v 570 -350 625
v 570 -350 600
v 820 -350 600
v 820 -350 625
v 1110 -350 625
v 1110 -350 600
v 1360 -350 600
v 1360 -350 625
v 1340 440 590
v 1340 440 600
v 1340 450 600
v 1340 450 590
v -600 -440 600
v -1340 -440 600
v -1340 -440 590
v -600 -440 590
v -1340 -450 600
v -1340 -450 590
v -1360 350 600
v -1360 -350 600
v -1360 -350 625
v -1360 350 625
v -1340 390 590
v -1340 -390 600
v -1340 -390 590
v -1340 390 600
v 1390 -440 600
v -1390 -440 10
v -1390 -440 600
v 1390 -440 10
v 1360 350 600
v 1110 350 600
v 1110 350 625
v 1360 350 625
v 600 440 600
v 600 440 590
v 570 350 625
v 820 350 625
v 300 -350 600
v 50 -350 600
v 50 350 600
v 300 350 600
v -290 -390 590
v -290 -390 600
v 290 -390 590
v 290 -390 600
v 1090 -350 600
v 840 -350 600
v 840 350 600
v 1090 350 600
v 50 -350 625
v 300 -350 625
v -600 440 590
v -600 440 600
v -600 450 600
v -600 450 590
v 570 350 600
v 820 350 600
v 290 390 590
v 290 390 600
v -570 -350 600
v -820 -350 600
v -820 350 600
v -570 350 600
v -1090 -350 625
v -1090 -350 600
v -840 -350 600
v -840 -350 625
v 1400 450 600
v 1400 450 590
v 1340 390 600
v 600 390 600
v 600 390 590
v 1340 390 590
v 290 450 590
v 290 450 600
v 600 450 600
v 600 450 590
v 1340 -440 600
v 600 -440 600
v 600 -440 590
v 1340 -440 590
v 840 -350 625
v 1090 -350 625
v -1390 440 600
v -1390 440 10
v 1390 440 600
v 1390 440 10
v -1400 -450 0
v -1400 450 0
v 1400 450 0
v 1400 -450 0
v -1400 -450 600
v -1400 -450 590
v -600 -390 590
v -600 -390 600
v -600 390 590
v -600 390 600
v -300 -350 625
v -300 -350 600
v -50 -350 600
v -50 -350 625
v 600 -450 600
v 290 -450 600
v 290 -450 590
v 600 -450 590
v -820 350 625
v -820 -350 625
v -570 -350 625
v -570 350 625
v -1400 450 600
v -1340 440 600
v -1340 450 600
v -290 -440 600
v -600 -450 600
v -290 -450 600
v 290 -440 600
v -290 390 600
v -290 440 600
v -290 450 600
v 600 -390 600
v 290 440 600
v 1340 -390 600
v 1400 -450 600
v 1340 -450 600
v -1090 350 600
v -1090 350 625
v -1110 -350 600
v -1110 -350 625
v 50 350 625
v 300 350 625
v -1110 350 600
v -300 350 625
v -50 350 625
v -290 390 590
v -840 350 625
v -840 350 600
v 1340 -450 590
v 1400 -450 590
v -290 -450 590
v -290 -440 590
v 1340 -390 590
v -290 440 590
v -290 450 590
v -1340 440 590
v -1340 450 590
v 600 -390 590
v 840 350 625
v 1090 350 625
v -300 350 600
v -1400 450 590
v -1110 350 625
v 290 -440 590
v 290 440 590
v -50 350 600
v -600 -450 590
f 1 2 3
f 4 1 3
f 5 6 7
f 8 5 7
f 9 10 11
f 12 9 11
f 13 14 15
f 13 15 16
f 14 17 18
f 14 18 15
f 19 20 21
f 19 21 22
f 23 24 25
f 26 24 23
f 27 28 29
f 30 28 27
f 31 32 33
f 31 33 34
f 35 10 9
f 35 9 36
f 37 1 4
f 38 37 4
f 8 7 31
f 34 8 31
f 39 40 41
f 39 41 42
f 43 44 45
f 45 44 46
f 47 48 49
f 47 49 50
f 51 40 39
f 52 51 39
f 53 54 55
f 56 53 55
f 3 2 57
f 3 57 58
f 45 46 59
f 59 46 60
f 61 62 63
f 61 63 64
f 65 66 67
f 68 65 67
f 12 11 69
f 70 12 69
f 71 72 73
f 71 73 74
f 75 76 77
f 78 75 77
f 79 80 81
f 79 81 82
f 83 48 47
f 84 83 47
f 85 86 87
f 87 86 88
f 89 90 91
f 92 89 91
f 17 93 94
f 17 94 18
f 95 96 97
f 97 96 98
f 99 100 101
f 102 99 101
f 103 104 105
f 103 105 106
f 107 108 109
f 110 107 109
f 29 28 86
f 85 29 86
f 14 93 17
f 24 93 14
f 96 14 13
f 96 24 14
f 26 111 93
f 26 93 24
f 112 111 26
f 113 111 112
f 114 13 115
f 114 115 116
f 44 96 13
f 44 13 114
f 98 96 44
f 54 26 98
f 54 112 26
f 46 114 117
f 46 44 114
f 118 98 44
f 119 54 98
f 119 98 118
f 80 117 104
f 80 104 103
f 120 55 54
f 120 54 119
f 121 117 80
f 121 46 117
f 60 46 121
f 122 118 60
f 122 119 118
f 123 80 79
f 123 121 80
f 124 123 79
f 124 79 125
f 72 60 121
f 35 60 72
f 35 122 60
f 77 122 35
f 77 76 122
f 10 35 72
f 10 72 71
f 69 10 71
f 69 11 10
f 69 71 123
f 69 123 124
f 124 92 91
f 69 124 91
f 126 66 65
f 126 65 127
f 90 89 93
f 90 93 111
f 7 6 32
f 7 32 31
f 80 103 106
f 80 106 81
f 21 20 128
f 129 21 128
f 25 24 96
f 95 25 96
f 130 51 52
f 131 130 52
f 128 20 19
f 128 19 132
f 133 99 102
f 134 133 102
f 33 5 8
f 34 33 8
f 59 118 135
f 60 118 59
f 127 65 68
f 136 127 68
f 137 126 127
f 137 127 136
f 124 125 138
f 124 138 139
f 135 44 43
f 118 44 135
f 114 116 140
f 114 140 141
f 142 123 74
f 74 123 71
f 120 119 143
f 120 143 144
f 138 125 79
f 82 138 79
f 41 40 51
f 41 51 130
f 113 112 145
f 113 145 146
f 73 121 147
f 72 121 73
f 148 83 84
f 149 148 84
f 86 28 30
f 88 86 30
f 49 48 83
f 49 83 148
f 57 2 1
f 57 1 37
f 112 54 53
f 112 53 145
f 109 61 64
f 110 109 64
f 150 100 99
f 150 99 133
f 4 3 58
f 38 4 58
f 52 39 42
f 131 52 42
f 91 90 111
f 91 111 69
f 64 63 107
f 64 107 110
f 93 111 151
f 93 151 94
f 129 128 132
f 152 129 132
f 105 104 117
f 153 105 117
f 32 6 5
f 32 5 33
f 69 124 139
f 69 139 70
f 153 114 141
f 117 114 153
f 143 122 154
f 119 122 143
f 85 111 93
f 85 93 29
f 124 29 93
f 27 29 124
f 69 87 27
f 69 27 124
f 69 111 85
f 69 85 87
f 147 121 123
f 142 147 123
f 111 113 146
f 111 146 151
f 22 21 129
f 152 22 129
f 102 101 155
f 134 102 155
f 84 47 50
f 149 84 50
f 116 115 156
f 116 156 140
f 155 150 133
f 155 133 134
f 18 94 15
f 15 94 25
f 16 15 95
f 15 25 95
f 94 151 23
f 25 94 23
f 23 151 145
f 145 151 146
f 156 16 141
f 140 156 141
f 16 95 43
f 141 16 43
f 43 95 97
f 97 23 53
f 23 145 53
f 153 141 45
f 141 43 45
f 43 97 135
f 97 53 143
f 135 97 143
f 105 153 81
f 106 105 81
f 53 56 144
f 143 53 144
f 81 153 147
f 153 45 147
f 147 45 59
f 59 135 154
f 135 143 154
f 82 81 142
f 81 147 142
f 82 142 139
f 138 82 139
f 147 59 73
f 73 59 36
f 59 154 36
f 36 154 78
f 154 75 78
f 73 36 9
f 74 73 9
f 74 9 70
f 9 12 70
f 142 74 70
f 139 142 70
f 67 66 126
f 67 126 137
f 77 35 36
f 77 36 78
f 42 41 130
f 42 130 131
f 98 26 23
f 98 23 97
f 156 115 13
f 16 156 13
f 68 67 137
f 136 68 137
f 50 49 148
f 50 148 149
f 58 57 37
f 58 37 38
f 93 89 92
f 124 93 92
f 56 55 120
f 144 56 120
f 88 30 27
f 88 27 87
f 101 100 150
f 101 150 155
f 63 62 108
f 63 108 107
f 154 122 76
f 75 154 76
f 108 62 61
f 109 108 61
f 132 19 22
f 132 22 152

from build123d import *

# Parameters (mm, degrees)
F0_W     = 2800
F0_H     = 900
F0_W_2   = 2780
F0_H_2   = 880
F1_DEPTH = 600
F2_W     = 2800
F2_H     = 900
F3_DEPTH = 10
F4_W     = 740
F4_H     = 780
F4_W_2   = 580
F4_W_3   = 310
F4_H_2   = 10
F4_W_4   = 60
F5_DEPTH = 10
F6_W     = 250
F6_H     = 700
F7_DEPTH = 25


with BuildPart() as f1:
    # F0 (on Top) → F1 (new body)
    with BuildSketch(Plane.XY):
        Rectangle(F0_W, F0_H)
        Rectangle(F0_W_2, F0_H_2, mode=Mode.SUBTRACT)
    extrude(amount=F1_DEPTH)

    # F2 (on face) → F3 (join)
    with BuildSketch(Plane(origin=(0, 0, 0), x_dir=(1, 0, 0), z_dir=(0, 0, -1))):
        Rectangle(F2_W, F2_H)
    extrude(amount=-F3_DEPTH)


with BuildPart() as f5:
    # F4 (on face) → F5 (new body)
    with BuildSketch(Plane.XY.offset(600)):
        Polygon((-1400, 450), (-1400, -450), (-1340, -450), (-1340, -440), (-600, -440), (-290, -440), (290, -440), (600, -440), (1340, -440), (1400, -440), (1400, -390), (1400, 390), (1400, 440), (1340, 440), (600, 440), (290, 440), (-290, 440), (-600, 440), (-1340, 440), (-1340, 450), align=None)
        with Locations((-970, 0)):
            Rectangle(F4_W, F4_H, mode=Mode.SUBTRACT)
        Rectangle(F4_W_2, F4_H, mode=Mode.SUBTRACT)
        with Locations((970, 0)):
            Rectangle(F4_W, F4_H, mode=Mode.SUBTRACT)
        with Locations((-445, -445)):
            Rectangle(F4_W_3, F4_H_2)
        with Locations((-445, 445)):
            Rectangle(F4_W_3, F4_H_2)
        with Locations((445, -445)):
            Rectangle(F4_W_3, F4_H_2)
        with Locations((445, 445)):
            Rectangle(F4_W_3, F4_H_2)
        with Locations((1370, -445)):
            Rectangle(F4_W_4, F4_H_2)
        with Locations((1370, 445)):
            Rectangle(F4_W_4, F4_H_2)
    extrude(amount=-F5_DEPTH)


with BuildPart() as f7:
    # F6 (on face) → F7 (new body)
    with BuildSketch(Plane.XY.offset(600)):
        with Locations((-1235, 0)):
            Rectangle(F6_W, F6_H)
        with Locations((-965, 0)):
            Rectangle(F6_W, F6_H)
        with Locations((-695, 0)):
            Rectangle(F6_W, F6_H)
        with Locations((-175, 0)):
            Rectangle(F6_W, F6_H)
        with Locations((175, 0)):
            Rectangle(F6_W, F6_H)
        with Locations((965, 0)):
            Rectangle(F6_W, F6_H)
        with Locations((695, 0)):
            Rectangle(F6_W, F6_H)
        with Locations((1235, 0)):
            Rectangle(F6_W, F6_H)
    extrude(amount=F7_DEPTH)


solid = Compound([f1.part, f5.part, f7.part])
